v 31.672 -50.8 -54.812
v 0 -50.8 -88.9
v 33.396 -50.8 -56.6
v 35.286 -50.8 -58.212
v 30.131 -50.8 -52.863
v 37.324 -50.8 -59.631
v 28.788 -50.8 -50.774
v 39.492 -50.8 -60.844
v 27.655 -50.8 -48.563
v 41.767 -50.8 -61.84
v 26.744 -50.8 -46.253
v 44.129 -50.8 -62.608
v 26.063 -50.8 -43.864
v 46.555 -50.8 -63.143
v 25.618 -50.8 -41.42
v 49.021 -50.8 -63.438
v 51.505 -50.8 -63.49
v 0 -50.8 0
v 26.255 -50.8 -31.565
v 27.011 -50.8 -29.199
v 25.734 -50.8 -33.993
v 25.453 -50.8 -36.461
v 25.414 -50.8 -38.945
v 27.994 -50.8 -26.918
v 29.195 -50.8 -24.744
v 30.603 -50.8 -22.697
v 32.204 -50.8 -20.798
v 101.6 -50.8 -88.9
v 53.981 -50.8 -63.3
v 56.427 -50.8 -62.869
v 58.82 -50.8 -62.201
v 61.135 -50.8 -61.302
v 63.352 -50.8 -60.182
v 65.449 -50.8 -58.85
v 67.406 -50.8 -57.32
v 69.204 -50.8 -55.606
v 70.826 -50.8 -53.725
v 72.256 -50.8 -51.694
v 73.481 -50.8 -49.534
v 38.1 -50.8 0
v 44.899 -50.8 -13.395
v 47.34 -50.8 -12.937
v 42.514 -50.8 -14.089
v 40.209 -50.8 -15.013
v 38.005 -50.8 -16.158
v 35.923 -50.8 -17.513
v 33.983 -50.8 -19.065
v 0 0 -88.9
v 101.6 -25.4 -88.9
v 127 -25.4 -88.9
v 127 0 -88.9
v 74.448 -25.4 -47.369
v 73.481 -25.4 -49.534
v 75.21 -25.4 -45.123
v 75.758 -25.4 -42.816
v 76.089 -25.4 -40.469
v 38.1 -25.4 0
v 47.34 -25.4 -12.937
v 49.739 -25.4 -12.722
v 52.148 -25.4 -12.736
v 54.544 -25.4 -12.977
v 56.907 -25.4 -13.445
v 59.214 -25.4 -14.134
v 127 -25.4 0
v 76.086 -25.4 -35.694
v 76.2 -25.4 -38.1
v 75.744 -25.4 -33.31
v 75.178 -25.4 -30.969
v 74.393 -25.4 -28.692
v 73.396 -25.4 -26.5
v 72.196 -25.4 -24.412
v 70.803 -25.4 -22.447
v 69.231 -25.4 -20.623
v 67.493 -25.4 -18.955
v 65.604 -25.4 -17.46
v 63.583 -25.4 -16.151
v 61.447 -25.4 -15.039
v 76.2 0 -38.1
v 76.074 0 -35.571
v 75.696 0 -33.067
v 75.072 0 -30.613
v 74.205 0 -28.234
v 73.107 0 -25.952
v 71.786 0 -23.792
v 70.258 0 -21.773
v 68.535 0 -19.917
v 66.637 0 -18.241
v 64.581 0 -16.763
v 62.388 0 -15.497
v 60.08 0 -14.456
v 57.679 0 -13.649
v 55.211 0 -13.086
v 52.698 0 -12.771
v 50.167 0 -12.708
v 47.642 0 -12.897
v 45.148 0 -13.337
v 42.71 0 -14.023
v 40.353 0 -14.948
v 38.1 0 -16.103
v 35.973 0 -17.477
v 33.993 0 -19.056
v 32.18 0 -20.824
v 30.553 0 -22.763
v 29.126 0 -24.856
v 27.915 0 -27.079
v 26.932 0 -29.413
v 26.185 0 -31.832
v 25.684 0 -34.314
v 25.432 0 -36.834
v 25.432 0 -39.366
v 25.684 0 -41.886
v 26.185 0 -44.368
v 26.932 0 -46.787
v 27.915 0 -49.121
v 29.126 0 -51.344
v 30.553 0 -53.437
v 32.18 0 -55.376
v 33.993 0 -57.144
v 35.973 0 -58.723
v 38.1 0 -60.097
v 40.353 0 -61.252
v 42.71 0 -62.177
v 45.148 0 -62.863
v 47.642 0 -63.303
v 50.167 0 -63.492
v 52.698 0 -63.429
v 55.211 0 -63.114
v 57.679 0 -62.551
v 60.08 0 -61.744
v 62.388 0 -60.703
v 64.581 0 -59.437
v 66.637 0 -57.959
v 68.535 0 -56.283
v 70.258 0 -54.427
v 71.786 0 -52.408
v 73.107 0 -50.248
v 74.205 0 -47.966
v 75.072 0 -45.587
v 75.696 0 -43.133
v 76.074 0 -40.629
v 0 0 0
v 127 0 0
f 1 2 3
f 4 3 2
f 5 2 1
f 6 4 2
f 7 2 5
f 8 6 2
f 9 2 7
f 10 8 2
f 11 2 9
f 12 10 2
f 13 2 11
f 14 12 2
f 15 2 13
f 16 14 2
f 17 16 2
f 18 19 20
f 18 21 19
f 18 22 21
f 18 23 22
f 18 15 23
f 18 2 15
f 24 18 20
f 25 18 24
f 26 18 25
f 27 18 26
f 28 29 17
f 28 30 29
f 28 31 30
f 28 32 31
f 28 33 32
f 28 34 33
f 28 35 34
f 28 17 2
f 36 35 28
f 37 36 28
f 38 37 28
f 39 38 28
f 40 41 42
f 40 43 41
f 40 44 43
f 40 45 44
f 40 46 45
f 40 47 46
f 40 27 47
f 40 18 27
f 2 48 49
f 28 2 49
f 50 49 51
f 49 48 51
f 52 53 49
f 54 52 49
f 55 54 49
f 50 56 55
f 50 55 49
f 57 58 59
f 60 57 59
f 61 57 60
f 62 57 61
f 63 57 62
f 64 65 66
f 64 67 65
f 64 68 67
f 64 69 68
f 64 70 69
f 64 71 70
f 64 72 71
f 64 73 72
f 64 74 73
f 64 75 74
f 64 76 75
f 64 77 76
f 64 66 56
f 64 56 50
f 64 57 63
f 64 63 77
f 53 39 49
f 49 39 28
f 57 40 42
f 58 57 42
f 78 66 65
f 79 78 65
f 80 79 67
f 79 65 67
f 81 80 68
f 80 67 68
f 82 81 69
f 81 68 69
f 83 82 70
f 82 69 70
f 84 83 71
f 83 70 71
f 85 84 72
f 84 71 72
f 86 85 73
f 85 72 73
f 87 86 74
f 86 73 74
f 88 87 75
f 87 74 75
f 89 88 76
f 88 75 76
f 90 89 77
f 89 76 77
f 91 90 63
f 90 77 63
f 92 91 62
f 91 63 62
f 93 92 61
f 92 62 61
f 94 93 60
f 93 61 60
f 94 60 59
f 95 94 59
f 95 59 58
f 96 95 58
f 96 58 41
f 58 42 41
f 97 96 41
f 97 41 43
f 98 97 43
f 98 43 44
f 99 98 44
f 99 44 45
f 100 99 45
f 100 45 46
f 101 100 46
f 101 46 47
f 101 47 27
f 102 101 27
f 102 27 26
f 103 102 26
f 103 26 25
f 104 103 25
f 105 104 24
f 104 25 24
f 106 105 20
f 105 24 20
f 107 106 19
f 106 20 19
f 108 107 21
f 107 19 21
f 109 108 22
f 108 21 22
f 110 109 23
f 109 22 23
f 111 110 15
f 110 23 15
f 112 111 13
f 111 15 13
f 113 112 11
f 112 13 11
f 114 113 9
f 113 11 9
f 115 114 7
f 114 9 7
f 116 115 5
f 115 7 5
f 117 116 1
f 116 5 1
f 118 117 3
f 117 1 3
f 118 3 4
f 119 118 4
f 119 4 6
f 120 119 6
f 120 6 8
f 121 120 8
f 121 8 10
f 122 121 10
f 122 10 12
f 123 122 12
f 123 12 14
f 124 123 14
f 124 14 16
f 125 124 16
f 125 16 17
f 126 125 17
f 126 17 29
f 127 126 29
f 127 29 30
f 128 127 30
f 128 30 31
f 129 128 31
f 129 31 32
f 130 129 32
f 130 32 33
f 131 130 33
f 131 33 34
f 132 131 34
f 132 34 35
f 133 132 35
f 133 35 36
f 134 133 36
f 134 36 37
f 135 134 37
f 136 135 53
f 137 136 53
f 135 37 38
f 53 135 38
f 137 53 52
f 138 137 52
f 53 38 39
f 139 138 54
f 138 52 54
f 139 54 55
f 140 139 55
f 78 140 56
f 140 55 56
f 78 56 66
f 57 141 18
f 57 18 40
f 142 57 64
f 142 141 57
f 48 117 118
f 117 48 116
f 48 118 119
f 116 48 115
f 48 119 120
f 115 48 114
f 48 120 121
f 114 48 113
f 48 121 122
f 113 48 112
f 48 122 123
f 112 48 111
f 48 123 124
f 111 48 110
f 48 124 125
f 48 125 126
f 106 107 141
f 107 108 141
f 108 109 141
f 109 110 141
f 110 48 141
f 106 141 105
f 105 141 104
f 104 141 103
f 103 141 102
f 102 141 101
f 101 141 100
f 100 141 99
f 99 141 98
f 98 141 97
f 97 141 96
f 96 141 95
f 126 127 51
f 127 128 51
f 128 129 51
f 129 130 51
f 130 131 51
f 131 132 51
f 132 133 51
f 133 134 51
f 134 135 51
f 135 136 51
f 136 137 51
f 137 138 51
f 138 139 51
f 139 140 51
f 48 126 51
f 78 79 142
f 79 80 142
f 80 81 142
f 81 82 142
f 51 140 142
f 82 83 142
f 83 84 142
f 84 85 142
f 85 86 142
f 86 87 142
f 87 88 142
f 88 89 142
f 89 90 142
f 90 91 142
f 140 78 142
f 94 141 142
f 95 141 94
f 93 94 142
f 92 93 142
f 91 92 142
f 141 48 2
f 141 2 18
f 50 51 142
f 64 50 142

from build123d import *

# Parameters (mm, degrees)
F0_W     = 127
F0_H     = 88.9
F1_DEPTH = 50.8
F3_DEPTH = 25.4
F4_R     = 25.4
F5_DEPTH = 50.8


with BuildPart() as f1:
    # F0 (on Front) → F1 (new body)
    with BuildSketch(Plane.XZ):
        with Locations((63.5, -44.45)):
            Rectangle(F0_W, F0_H)
    extrude(amount=F1_DEPTH)

    # F2 (on face) → F3 (cut)
    with BuildSketch(Plane.XZ.offset(50.8)):
        Polygon((127, 0), (38.1, 0), (101.6, -88.9), (127, -88.9), align=None)
    extrude(amount=-F3_DEPTH, mode=Mode.SUBTRACT)

    # F4 (on face) → F5 (cut)
    with BuildSketch(Plane.XZ.offset(50.8)):
        with Locations((50.8, -38.1)):
            Circle(F4_R)
    extrude(amount=-F5_DEPTH, mode=Mode.SUBTRACT)


solid = f1.part
